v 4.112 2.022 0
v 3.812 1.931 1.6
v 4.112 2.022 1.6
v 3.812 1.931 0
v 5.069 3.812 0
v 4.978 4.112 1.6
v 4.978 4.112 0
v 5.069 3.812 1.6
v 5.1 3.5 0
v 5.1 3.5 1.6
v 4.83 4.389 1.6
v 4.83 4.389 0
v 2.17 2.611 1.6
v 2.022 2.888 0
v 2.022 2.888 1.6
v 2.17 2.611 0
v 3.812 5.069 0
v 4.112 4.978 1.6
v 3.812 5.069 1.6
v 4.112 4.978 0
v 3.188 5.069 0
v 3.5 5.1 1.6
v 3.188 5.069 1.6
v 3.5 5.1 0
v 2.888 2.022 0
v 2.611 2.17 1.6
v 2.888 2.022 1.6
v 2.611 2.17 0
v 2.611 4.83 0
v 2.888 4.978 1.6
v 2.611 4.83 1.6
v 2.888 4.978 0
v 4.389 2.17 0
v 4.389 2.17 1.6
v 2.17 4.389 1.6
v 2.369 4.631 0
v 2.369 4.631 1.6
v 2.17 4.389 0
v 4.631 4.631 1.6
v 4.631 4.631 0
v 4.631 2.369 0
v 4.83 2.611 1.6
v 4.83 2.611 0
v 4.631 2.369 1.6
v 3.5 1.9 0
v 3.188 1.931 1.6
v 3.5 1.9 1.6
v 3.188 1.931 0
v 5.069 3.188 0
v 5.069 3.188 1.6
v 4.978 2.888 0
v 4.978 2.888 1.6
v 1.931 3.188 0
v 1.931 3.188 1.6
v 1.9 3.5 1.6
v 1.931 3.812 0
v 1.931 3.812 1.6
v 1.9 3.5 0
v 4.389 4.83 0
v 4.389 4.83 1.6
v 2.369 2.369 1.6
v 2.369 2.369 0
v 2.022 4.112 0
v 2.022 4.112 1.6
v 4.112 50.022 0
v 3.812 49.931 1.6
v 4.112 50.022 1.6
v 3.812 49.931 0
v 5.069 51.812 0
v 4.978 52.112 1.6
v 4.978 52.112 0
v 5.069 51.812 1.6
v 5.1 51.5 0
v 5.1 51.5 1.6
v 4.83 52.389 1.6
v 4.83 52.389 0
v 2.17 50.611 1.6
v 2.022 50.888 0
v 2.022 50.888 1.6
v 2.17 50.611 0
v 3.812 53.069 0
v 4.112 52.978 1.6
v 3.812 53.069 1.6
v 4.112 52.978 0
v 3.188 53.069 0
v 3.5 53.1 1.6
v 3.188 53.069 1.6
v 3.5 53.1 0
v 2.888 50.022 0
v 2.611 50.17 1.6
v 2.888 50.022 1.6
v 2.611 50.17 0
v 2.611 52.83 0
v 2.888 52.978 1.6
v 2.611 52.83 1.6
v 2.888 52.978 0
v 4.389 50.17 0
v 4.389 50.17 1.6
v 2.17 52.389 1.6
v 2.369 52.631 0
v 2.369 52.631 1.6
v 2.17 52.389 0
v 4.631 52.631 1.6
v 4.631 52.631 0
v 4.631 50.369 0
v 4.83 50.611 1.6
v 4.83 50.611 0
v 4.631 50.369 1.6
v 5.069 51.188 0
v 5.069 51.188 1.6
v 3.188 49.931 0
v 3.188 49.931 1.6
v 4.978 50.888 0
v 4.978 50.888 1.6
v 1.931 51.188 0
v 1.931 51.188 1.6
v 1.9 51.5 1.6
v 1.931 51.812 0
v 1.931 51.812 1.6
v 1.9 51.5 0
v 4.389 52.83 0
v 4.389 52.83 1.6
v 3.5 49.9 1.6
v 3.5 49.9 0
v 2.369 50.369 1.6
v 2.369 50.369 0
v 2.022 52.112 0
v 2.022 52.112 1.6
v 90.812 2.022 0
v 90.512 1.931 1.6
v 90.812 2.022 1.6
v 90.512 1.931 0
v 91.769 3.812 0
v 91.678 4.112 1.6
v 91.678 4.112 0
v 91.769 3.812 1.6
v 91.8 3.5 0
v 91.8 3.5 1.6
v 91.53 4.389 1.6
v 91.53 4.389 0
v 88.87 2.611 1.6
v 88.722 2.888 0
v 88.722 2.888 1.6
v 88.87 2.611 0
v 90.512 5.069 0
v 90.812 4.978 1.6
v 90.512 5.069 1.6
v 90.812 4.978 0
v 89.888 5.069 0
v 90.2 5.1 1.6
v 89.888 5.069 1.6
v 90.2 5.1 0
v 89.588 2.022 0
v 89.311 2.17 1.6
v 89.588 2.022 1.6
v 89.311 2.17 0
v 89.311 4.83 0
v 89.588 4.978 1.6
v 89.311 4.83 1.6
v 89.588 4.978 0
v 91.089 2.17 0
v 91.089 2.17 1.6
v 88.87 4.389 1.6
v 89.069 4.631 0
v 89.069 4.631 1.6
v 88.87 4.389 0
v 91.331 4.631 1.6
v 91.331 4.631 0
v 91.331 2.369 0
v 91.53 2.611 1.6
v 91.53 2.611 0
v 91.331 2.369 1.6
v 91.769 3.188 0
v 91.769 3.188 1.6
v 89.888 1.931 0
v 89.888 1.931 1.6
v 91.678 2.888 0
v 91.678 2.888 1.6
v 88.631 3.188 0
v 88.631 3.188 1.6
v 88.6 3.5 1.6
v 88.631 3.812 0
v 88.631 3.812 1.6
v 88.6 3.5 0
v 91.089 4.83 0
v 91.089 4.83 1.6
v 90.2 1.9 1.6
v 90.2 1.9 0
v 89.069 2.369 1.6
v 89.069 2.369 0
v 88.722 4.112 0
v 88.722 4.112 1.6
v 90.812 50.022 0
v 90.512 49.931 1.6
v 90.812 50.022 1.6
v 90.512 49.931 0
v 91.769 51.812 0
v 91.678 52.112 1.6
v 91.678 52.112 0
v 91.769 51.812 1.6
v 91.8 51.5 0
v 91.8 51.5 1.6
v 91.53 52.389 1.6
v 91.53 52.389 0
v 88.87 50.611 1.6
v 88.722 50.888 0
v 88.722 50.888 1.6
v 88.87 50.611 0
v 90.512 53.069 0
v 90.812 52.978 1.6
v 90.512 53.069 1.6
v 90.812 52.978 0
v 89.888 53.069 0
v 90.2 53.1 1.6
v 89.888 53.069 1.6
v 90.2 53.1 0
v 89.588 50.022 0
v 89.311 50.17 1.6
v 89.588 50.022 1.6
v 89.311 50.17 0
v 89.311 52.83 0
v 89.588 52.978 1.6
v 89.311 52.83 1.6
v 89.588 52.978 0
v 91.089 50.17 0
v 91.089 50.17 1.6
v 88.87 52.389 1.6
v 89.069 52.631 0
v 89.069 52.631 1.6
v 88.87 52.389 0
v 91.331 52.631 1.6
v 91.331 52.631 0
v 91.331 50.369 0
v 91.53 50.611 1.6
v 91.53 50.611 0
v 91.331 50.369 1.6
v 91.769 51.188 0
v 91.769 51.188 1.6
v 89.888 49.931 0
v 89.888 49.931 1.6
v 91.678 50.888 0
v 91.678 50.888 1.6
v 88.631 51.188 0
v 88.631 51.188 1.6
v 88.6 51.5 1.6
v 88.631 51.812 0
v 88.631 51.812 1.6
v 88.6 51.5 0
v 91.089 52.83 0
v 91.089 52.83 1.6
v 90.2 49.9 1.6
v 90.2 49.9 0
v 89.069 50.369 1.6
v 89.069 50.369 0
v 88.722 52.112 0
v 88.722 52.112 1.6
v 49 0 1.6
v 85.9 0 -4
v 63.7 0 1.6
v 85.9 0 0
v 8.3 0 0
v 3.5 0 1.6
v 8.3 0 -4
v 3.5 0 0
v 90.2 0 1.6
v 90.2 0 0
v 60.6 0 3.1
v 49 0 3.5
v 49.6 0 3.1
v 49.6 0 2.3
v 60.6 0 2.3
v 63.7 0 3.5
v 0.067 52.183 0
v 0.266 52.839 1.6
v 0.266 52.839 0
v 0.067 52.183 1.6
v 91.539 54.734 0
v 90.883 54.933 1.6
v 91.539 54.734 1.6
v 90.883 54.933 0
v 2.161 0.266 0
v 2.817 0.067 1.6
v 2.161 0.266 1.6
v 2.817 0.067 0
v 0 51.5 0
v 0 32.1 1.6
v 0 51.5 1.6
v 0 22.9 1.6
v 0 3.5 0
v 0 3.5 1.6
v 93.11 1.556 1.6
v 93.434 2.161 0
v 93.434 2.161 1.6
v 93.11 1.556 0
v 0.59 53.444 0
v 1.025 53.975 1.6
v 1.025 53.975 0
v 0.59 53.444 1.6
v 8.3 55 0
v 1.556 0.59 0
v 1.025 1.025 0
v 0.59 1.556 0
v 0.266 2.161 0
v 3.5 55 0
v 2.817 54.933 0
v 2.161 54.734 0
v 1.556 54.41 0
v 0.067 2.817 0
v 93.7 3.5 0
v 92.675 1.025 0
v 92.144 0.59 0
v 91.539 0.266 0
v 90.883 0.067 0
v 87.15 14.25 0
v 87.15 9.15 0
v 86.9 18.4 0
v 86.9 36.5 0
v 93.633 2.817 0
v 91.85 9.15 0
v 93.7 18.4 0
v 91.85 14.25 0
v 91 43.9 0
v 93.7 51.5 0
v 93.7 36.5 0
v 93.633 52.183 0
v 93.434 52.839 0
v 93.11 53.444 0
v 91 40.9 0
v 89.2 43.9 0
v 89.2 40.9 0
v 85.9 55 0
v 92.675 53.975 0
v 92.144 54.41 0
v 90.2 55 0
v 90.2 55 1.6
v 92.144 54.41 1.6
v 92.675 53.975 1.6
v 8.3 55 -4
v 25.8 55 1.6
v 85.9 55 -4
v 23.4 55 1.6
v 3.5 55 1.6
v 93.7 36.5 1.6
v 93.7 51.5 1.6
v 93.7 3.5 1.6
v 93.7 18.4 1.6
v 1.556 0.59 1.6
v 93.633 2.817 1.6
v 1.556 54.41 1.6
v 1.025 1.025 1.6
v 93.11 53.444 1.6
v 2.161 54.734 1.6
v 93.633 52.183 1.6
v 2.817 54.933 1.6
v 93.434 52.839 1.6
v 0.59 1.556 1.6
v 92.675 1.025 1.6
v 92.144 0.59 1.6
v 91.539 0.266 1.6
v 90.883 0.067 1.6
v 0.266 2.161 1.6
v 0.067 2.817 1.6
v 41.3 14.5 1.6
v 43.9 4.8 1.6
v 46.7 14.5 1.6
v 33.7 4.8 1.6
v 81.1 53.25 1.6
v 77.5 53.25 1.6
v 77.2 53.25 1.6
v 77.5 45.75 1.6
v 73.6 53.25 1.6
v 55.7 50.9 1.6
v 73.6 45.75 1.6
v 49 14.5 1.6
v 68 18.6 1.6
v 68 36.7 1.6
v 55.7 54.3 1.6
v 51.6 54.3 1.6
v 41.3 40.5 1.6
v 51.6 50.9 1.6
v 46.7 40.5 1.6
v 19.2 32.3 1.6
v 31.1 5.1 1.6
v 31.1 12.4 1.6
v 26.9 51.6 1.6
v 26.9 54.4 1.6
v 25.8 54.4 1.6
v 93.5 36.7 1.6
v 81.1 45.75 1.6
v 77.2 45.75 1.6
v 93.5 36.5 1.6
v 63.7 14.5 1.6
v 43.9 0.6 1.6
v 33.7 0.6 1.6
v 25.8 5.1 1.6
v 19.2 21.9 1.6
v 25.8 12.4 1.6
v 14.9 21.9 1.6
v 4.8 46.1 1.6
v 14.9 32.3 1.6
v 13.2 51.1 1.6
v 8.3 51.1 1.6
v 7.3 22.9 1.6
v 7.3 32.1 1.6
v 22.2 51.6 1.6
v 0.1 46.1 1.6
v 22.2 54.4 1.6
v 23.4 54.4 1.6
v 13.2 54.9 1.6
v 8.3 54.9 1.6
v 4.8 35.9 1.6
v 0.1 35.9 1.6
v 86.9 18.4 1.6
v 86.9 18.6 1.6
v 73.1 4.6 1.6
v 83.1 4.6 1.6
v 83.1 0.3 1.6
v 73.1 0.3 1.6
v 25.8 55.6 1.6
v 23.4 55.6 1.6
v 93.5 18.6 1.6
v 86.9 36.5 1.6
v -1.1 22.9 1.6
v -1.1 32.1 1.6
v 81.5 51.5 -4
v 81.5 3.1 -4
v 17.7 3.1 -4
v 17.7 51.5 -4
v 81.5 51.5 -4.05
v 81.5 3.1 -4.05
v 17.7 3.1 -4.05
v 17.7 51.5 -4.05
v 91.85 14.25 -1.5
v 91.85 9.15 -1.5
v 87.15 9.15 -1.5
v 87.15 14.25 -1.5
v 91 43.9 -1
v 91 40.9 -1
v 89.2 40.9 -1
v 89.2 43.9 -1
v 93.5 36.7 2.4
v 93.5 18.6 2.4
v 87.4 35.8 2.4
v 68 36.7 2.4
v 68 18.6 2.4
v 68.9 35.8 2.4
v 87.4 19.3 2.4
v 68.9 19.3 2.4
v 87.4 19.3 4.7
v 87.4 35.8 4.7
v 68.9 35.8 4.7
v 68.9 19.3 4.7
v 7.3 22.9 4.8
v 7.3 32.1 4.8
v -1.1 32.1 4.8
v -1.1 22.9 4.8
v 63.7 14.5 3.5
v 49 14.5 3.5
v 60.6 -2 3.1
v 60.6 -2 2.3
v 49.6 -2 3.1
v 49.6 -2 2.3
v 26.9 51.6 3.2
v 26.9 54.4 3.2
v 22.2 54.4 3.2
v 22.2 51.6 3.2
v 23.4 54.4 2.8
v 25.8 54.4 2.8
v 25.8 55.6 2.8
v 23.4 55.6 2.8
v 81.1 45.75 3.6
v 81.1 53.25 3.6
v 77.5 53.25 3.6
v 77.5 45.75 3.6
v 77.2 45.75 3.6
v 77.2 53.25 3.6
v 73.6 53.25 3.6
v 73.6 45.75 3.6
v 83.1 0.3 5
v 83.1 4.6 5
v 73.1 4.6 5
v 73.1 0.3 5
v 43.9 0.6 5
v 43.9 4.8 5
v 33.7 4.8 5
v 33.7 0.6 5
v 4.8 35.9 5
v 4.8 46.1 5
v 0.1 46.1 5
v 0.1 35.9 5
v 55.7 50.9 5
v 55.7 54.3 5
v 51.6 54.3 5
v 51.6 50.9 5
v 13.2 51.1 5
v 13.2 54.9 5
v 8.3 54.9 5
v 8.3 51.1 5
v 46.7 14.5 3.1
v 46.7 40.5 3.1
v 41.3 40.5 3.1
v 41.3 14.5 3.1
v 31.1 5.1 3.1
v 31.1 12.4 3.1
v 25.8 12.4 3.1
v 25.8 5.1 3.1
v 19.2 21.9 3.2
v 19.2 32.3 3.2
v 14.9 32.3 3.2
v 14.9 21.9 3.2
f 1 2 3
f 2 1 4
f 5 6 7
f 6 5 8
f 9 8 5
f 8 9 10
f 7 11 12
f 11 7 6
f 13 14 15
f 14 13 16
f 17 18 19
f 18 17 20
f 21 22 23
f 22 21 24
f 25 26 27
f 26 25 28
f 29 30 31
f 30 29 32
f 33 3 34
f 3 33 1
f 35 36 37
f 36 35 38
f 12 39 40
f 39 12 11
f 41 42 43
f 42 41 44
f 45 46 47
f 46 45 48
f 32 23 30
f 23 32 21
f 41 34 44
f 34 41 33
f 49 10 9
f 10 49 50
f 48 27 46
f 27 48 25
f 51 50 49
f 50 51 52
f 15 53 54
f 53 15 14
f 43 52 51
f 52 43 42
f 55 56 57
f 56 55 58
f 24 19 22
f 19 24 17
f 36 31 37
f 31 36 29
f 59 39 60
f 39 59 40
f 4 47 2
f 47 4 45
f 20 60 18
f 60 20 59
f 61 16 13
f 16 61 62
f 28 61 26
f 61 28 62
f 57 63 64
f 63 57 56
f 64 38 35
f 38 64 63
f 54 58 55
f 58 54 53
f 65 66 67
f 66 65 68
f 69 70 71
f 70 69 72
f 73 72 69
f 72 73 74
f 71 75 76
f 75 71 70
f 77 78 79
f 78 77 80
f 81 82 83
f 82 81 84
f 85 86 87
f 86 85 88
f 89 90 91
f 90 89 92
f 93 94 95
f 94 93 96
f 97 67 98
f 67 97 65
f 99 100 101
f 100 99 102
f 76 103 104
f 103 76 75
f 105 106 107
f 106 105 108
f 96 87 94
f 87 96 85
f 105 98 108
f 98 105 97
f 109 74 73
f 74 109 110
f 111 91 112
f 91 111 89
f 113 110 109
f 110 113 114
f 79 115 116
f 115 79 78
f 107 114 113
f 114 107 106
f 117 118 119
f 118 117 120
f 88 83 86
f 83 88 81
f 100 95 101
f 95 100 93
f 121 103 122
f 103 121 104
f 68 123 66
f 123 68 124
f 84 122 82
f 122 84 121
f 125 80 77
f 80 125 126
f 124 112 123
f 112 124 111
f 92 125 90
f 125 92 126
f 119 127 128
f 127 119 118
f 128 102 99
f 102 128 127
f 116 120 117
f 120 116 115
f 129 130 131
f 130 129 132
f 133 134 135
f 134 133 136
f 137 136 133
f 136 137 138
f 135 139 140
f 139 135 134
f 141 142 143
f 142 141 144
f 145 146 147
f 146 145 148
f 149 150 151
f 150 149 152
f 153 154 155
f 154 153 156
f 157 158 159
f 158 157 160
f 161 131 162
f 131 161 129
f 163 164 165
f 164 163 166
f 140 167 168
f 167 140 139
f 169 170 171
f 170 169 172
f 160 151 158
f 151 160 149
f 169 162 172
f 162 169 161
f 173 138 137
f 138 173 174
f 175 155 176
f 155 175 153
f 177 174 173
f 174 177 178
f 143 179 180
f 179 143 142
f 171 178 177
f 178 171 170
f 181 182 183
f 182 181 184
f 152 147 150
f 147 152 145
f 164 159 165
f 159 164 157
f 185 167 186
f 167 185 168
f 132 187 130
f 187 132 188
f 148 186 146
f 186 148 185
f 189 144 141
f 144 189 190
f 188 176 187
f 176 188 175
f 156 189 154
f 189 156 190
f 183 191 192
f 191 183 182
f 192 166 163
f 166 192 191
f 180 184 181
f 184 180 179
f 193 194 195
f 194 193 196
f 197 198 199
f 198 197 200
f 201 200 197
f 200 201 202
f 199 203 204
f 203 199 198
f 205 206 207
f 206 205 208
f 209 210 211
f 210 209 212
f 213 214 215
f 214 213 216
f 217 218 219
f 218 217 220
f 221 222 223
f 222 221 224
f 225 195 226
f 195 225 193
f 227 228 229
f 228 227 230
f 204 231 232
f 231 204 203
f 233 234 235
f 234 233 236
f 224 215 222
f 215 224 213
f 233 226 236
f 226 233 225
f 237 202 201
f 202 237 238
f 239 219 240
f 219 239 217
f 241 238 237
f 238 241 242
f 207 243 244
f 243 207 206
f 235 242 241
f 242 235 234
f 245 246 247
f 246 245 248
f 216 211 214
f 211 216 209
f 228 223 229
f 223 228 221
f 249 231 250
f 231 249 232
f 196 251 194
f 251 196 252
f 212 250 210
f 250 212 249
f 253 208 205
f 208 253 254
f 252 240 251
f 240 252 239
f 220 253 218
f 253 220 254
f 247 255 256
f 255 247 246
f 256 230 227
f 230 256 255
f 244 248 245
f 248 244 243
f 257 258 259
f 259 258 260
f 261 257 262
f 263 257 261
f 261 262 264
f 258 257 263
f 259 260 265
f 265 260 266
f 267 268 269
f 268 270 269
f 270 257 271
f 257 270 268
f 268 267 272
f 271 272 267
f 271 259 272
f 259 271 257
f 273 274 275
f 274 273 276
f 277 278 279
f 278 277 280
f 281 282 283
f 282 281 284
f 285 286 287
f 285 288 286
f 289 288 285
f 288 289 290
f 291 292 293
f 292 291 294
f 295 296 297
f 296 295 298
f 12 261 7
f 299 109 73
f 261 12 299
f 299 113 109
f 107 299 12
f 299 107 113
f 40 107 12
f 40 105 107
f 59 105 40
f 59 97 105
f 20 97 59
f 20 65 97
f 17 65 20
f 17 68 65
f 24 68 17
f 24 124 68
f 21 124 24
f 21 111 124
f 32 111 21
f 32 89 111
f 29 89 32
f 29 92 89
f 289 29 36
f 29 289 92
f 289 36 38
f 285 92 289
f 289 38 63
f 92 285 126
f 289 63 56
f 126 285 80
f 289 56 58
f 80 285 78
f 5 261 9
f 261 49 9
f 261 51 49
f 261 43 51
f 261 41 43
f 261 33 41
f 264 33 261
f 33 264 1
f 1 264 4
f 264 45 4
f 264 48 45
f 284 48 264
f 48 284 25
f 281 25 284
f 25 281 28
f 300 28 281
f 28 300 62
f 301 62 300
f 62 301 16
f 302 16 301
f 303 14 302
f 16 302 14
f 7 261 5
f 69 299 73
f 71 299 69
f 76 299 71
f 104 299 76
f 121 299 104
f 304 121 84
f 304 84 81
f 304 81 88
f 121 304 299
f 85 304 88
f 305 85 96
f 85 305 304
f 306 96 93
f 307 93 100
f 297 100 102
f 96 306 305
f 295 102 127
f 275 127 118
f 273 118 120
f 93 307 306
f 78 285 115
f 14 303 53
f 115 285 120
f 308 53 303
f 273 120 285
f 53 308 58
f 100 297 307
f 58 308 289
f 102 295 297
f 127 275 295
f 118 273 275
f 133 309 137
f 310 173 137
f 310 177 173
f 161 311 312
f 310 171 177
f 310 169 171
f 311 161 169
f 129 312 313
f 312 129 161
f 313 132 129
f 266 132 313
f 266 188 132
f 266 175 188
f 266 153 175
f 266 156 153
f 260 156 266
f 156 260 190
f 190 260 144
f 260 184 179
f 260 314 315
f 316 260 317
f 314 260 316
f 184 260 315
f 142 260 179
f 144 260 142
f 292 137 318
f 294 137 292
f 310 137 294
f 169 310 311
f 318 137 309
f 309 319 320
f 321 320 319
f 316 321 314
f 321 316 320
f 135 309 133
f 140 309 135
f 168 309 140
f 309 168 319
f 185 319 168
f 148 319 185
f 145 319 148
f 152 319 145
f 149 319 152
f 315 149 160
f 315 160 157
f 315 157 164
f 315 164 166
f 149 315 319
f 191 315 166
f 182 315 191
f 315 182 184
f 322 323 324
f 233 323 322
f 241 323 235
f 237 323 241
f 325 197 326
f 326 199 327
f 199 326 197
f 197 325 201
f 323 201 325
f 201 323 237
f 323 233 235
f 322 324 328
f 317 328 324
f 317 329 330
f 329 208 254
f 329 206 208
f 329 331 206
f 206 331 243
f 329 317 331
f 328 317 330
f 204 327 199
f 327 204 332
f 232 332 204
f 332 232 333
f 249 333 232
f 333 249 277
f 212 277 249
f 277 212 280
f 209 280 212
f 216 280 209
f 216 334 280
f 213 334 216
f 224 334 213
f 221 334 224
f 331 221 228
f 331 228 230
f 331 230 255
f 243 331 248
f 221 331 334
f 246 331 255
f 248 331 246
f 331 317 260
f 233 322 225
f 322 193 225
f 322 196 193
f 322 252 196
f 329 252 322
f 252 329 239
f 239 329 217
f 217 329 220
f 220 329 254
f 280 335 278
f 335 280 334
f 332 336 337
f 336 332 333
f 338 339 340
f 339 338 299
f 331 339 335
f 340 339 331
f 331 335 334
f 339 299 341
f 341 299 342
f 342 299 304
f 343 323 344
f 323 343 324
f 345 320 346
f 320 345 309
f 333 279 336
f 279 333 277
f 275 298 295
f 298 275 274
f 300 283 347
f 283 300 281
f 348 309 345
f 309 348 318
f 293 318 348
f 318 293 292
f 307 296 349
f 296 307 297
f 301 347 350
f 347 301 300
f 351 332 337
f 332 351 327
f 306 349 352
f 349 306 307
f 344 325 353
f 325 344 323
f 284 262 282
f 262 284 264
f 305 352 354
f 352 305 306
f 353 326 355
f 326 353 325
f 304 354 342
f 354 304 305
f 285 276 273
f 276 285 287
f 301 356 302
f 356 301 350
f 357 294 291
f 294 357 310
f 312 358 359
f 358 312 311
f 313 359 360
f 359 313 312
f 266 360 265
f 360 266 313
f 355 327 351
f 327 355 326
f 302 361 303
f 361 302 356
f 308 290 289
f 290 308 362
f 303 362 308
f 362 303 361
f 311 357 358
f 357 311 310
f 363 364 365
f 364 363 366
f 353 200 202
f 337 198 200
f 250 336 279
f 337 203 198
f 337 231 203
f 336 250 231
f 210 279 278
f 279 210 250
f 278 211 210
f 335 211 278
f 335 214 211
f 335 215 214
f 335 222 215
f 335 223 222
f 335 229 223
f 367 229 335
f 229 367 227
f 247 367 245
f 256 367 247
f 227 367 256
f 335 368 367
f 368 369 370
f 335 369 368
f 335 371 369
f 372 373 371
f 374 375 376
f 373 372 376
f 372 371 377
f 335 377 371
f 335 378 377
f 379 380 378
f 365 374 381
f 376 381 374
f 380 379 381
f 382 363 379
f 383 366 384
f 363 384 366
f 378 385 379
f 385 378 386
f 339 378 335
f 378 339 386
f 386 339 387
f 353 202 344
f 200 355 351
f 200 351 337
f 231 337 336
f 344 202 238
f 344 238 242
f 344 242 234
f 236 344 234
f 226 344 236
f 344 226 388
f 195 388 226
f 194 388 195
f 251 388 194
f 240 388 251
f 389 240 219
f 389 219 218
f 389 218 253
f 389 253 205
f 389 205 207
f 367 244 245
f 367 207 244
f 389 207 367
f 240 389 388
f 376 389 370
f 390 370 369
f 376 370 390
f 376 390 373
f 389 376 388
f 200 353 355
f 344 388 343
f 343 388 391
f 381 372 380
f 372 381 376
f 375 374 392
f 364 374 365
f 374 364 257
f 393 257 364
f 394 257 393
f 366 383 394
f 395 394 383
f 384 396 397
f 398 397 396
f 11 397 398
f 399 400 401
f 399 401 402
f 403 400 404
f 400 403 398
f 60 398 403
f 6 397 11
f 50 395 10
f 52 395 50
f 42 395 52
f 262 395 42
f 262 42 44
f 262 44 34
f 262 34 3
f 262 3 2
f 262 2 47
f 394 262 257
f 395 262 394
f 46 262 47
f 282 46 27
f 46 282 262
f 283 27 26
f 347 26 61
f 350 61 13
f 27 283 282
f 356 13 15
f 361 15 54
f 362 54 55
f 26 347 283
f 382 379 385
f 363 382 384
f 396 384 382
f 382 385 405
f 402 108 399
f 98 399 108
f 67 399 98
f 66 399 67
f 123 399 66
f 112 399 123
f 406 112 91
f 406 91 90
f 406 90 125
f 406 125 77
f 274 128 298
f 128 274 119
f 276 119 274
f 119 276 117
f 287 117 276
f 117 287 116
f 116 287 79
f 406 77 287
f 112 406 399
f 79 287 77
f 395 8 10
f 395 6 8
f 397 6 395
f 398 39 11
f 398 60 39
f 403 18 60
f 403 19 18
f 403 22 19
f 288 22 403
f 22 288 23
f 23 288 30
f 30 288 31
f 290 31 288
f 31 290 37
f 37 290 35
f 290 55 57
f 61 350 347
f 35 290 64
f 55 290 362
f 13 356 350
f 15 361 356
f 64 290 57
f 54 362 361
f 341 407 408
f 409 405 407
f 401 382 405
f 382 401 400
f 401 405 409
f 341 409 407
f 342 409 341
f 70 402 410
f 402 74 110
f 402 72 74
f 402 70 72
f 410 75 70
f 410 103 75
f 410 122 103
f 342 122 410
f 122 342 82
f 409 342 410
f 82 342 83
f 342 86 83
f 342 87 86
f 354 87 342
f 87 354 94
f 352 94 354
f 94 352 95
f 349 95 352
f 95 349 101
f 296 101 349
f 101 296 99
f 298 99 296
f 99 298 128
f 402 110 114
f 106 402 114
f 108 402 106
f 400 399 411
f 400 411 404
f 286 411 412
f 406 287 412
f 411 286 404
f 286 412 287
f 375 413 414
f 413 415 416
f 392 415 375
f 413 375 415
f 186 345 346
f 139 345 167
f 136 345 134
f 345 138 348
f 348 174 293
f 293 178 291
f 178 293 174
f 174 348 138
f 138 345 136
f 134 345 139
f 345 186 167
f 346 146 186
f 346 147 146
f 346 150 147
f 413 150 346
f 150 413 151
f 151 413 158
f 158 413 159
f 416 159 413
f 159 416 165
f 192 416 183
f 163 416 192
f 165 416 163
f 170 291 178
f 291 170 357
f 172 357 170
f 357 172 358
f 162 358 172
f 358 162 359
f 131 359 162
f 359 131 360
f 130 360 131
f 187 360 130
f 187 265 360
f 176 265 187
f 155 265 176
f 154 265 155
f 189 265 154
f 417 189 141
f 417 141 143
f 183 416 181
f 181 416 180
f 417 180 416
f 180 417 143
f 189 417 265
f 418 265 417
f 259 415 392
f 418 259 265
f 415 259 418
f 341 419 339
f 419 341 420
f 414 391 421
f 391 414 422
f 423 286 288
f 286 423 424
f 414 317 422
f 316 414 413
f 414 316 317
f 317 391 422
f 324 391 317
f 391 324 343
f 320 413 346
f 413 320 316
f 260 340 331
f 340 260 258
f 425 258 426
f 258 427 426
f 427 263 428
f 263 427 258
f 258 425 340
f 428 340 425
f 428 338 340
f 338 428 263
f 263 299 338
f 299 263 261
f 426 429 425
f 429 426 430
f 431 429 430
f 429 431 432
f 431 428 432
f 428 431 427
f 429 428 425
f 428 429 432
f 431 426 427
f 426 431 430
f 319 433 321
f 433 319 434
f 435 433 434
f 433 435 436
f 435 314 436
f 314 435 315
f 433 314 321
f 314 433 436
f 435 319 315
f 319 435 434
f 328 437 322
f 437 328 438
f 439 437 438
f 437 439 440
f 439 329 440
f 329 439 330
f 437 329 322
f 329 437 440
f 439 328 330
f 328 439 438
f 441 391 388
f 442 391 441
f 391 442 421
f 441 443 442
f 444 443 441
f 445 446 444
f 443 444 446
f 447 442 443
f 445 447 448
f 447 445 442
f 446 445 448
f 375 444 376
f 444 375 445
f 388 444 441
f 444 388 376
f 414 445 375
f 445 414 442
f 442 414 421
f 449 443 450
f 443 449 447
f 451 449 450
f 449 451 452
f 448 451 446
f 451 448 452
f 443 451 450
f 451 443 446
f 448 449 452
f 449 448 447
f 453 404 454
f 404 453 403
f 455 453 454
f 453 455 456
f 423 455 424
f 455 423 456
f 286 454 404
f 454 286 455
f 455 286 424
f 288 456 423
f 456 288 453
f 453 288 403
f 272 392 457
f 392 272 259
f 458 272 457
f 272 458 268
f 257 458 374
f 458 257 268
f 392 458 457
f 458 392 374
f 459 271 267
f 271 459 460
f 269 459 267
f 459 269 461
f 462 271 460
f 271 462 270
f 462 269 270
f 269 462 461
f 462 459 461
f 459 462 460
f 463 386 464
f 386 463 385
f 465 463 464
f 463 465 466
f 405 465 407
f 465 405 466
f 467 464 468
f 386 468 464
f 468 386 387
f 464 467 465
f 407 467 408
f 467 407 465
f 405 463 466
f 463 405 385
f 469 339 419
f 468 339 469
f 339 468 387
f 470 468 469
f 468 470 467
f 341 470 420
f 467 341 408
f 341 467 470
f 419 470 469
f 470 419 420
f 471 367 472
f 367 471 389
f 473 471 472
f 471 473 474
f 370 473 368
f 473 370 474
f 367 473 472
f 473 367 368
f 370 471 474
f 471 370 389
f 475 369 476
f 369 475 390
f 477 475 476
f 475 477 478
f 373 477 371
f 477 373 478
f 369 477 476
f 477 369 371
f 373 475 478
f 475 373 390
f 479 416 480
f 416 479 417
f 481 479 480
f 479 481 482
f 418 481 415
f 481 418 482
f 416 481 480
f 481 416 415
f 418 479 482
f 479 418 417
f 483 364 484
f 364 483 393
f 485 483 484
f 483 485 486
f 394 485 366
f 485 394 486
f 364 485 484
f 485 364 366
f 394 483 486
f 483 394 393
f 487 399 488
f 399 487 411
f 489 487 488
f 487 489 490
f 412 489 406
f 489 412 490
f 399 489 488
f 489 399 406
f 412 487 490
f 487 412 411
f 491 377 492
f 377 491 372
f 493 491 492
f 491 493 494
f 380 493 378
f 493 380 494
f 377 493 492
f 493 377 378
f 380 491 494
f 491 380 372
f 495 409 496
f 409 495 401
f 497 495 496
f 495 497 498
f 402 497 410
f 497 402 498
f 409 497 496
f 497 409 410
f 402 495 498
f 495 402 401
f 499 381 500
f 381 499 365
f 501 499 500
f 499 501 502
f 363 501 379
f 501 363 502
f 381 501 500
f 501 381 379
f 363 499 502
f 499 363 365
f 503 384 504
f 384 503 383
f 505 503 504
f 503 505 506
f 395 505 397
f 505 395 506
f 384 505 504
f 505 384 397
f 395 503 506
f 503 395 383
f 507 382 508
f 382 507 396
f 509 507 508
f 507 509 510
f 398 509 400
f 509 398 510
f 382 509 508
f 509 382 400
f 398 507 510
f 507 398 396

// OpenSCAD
// Reference model of the ESP32-2432S032C board (Sunton 3.2-inch display
// board, capacitive touch, USB-C). Not a printed part: it is here to check
// the case against.
//
// WHERE THE NUMBERS COME FROM (details and links: README.md)
//   [D]  printed on the manufacturer's dimension drawing: outline 93.7 x 55,
//        holes 3.2 mm at 3.5 mm from the edges.
//   [P]  scaled from pictures: the same drawing (front) and the vendor's
//        rendering of the back. About +-0.3 mm, and a rendering is not a
//        photograph of the board on the bench.
//   [C]  cross-checked against the openings of two published cases for this
//        board (USB-C, microSD, power switch, RESET, BOOT, P1, P3, CN1 agree
//        within about 0.5 mm).
//   [E]  estimate: nothing published. ALL COMPONENT HEIGHTS are [E] or
//        typical values for the part type. Measure before trusting a
//        clearance in Z.
//
// No published 3D model of this board was found (2026-11-18).
//
// Coordinates of board_reference(): origin at the board's corner at the
// USB-C end on the microSD side, on the SCREEN side of the PCB. X along the
// length away from USB-C, Y across away from the microSD edge, Z from the
// screen side of the PCB towards the back; the screen is at negative Z.
// This is how resonance_case.scad looks at the board.
//
// The positions below are written in the frame of the back-view picture
// they were measured in (u from the antenna end, v from the power-switch
// edge) and converted by at(): x = 93.7 - u, y = 55 - v.

brd_l = 93.7;            // [D]
brd_w = 55.0;            // [D]
brd_t = 1.6;             // [E] usual thickness; one case's ledge implies it
brd_hole_inset = 3.5;    // [D]
brd_hole_d = 3.2;        // [D]
brd_corner_r = 3.5;      // [E] rounded corners, radius not dimensioned
brd_lcd_h = 4.0;         // measured: screen + touch glass above the PCB
brd_rear_h = 4.0;        // [C] upper bound: tallest part on the back

// Heights [E]
h_wroom = 3.1;           // module datasheet
h_usb = 3.2;             // USB-C mid-mount receptacle, typical
h_sd = 1.9;              // push-push microSD socket, typical
h_jst = 3.4;             // 1.25 mm side-entry header, typical
h_switch = 1.6;
h_tact = 2.0;            // RESET and BOOT
h_ic = 1.6;
h_fpc = 1.5;

// A block on the BACK of the board, given in the picture's frame:
// u0..u1 from the antenna end, v0..v1 from the power-switch edge.
module at(u0, u1, v0, v1, h, c = "dimgray") {
    color(c) translate([brd_l - u1, brd_w - v1, brd_t]) cube([u1 - u0, v1 - v0, h]);
}
// The same on the FRONT (screen side).
module at_front(u0, u1, v0, v1, h, c = "dimgray") {
    color(c) translate([brd_l - u1, brd_w - v1, -h]) cube([u1 - u0, v1 - v0, h]);
}

module board_pcb() {
    color("goldenrod") difference() {
        hull() for (x = [brd_corner_r, brd_l - brd_corner_r], y = [brd_corner_r, brd_w - brd_corner_r])
            translate([x, y, 0]) cylinder(r = brd_corner_r, h = brd_t, $fn = 32);
        for (x = [brd_hole_inset, brd_l - brd_hole_inset], y = [brd_hole_inset, brd_w - brd_hole_inset])
            translate([x, y, -1]) cylinder(d = brd_hole_d, h = brd_t + 2, $fn = 32);
        // Notch under the module's antenna. [P]
        translate([brd_l - 6.8, brd_w - 36.6, -1]) cube([6.8 + 1, 18.1, brd_t + 2]);
    }
}

module board_front() {
    // Display module with its touch glass. Size measured by the operator
    // (2026-11-18): 77.6 x 55.0, 4.0 above the board. Position along the
    // length [P], centred on the outline in the drawing.
    at_front(7.8, 85.4, 0.0, 55.0, brd_lcd_h, "black");
    // Lit area 64.8 x 48.6 (specification); position [P], +-0.5 along the length.
    color("lightskyblue") translate([brd_l - 76.0, brd_w - 51.9, -brd_lcd_h - 0.05]) cube([64.8 - 1.0, 48.4, 0.05]);
    // RGB LED (5050) and light sensor, beside the screen at the antenna end. [P][C]
    at_front(1.85, 6.55, 40.75, 45.85, 1.5, "white");
    at_front(2.7, 4.5, 11.1, 14.1, 1.0, "saddlebrown");
}

module board_back() {
    // ESP32-WROOM-32: module board and shield can. [P]; antenna over the notch.
    at(0.2, 25.7, 18.3, 36.4, 0.8, "black");
    at(6.3, 24.8, 19.2, 35.7, h_wroom, "silver");
    // USB-C: overhangs the end of the board by about 1.1 mm. [P][C]
    color("silver") translate([-1.1, 27.5 - 4.6, brd_t]) cube([8.4, 9.2, h_usb]);
    // microSD socket, flush with the edge. [P][C] The card's centre line is
    // about 1.2 mm off the socket's, at 55.1 mm from the USB-C end.
    at(30.0, 44.7, 40.5, 55.0, h_sd, "silver");
    // A card, pushed in: it stands about 2 mm out of the socket. [E]
    color("darkred") translate([brd_l - 38.6 - 5.5, -2, brd_t + 0.7]) cube([11, 12, 0.8]);
    // Power switch SW1 with its actuator over the edge. [P][C]
    at(66.8, 71.5, 0.6, 3.4, h_switch, "silver");
    at(67.9, 70.3, -0.6, 0.6, h_switch - 0.4, "black");
    // RESET and BOOT. [P][C]
    at(12.6, 16.2, 1.75, 9.25, h_tact, "silver");
    at(16.5, 20.1, 1.75, 9.25, h_tact, "silver");
    // 1.25 mm connectors. P3 and CN1 face the microSD edge, P1 the USB-C
    // end, speaker and battery the power-switch edge. [P]; P1, P3, CN1 also [C].
    at(10.6, 20.6, 50.4, 54.7, h_jst, "ivory");   // P3  "extended IO"
    at(49.8, 60.0, 50.2, 54.4, h_jst, "ivory");   // CN1 "temperature and humidity"
    at(88.9, 93.6, 8.9, 19.1, h_jst, "ivory");    // P1  serial / 5 V
    at(38.0, 42.1, 0.7, 4.1, h_jst, "ivory");     // speaker
    at(80.5, 85.4, 0.1, 3.9, h_jst, "orange");    // battery (P5)
    // Display and touch flat-cable connectors, and the largest IC. [P]
    at(47.0, 52.4, 14.5, 40.5, h_fpc, "ivory");
    at(62.6, 67.9, 42.6, 49.9, h_fpc, "ivory");
    at(74.5, 78.8, 22.7, 33.1, h_ic, "black");
}

module board_reference() {
    board_pcb();
    board_front();
    board_back();
}

// Shown when this file is opened by itself: back side up.
board_reference();
